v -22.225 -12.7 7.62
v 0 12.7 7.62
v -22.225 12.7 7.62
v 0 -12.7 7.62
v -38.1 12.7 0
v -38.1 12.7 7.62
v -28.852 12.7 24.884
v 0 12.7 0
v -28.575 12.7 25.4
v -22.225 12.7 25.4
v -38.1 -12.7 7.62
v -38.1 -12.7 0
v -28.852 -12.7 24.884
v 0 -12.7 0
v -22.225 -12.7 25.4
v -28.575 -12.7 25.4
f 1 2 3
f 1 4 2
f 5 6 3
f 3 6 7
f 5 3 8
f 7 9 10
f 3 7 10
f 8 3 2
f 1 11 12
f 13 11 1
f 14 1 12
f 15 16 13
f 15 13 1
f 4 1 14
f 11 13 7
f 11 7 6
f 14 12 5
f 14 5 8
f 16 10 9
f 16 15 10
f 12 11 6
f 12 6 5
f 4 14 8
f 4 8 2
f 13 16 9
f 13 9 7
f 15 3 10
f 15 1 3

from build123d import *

# Parameters (mm, degrees)
F3_DEPTH = 12.7


# Not quite as in the source:
# - the program builds the solid bodies; features that only make, move or delete a surface that nothing else refers to are left out


with BuildPart() as f3:
    # F2 (on Front) → F3 (new body, symmetric)
    with BuildSketch(Plane.XZ):
        with BuildLine():
            Line((-22.225, 25.4), (-28.3980633142, 25.4))
            ThreePointArc((-28.3980633142, 25.4), (-28.6260297603, 25.1428005632), (-28.8516668522, 24.8835552092))
            Line((-28.8516668522, 24.8835552092), (-38.1, 7.62))
            Line((-38.1, 7.62), (-38.1, 0))
            Line((-38.1, 0), (0, 0))
            Line((0, 0), (0, 7.62))
            Line((0, 7.62), (-22.225, 7.62))
            Line((-22.225, 7.62), (-22.225, 25.4))
        make_face()
        with BuildLine():
            ThreePointArc((-28.8516668522, 24.8835552092), (-28.6260297603, 25.1428005632), (-28.3980633142, 25.4))
            Line((-28.3980633142, 25.4), (-28.575, 25.4))
            Line((-28.575, 25.4), (-28.8516668522, 24.8835552092))
        make_face()
    extrude(amount=F3_DEPTH, both=True)


solid = f3.part
